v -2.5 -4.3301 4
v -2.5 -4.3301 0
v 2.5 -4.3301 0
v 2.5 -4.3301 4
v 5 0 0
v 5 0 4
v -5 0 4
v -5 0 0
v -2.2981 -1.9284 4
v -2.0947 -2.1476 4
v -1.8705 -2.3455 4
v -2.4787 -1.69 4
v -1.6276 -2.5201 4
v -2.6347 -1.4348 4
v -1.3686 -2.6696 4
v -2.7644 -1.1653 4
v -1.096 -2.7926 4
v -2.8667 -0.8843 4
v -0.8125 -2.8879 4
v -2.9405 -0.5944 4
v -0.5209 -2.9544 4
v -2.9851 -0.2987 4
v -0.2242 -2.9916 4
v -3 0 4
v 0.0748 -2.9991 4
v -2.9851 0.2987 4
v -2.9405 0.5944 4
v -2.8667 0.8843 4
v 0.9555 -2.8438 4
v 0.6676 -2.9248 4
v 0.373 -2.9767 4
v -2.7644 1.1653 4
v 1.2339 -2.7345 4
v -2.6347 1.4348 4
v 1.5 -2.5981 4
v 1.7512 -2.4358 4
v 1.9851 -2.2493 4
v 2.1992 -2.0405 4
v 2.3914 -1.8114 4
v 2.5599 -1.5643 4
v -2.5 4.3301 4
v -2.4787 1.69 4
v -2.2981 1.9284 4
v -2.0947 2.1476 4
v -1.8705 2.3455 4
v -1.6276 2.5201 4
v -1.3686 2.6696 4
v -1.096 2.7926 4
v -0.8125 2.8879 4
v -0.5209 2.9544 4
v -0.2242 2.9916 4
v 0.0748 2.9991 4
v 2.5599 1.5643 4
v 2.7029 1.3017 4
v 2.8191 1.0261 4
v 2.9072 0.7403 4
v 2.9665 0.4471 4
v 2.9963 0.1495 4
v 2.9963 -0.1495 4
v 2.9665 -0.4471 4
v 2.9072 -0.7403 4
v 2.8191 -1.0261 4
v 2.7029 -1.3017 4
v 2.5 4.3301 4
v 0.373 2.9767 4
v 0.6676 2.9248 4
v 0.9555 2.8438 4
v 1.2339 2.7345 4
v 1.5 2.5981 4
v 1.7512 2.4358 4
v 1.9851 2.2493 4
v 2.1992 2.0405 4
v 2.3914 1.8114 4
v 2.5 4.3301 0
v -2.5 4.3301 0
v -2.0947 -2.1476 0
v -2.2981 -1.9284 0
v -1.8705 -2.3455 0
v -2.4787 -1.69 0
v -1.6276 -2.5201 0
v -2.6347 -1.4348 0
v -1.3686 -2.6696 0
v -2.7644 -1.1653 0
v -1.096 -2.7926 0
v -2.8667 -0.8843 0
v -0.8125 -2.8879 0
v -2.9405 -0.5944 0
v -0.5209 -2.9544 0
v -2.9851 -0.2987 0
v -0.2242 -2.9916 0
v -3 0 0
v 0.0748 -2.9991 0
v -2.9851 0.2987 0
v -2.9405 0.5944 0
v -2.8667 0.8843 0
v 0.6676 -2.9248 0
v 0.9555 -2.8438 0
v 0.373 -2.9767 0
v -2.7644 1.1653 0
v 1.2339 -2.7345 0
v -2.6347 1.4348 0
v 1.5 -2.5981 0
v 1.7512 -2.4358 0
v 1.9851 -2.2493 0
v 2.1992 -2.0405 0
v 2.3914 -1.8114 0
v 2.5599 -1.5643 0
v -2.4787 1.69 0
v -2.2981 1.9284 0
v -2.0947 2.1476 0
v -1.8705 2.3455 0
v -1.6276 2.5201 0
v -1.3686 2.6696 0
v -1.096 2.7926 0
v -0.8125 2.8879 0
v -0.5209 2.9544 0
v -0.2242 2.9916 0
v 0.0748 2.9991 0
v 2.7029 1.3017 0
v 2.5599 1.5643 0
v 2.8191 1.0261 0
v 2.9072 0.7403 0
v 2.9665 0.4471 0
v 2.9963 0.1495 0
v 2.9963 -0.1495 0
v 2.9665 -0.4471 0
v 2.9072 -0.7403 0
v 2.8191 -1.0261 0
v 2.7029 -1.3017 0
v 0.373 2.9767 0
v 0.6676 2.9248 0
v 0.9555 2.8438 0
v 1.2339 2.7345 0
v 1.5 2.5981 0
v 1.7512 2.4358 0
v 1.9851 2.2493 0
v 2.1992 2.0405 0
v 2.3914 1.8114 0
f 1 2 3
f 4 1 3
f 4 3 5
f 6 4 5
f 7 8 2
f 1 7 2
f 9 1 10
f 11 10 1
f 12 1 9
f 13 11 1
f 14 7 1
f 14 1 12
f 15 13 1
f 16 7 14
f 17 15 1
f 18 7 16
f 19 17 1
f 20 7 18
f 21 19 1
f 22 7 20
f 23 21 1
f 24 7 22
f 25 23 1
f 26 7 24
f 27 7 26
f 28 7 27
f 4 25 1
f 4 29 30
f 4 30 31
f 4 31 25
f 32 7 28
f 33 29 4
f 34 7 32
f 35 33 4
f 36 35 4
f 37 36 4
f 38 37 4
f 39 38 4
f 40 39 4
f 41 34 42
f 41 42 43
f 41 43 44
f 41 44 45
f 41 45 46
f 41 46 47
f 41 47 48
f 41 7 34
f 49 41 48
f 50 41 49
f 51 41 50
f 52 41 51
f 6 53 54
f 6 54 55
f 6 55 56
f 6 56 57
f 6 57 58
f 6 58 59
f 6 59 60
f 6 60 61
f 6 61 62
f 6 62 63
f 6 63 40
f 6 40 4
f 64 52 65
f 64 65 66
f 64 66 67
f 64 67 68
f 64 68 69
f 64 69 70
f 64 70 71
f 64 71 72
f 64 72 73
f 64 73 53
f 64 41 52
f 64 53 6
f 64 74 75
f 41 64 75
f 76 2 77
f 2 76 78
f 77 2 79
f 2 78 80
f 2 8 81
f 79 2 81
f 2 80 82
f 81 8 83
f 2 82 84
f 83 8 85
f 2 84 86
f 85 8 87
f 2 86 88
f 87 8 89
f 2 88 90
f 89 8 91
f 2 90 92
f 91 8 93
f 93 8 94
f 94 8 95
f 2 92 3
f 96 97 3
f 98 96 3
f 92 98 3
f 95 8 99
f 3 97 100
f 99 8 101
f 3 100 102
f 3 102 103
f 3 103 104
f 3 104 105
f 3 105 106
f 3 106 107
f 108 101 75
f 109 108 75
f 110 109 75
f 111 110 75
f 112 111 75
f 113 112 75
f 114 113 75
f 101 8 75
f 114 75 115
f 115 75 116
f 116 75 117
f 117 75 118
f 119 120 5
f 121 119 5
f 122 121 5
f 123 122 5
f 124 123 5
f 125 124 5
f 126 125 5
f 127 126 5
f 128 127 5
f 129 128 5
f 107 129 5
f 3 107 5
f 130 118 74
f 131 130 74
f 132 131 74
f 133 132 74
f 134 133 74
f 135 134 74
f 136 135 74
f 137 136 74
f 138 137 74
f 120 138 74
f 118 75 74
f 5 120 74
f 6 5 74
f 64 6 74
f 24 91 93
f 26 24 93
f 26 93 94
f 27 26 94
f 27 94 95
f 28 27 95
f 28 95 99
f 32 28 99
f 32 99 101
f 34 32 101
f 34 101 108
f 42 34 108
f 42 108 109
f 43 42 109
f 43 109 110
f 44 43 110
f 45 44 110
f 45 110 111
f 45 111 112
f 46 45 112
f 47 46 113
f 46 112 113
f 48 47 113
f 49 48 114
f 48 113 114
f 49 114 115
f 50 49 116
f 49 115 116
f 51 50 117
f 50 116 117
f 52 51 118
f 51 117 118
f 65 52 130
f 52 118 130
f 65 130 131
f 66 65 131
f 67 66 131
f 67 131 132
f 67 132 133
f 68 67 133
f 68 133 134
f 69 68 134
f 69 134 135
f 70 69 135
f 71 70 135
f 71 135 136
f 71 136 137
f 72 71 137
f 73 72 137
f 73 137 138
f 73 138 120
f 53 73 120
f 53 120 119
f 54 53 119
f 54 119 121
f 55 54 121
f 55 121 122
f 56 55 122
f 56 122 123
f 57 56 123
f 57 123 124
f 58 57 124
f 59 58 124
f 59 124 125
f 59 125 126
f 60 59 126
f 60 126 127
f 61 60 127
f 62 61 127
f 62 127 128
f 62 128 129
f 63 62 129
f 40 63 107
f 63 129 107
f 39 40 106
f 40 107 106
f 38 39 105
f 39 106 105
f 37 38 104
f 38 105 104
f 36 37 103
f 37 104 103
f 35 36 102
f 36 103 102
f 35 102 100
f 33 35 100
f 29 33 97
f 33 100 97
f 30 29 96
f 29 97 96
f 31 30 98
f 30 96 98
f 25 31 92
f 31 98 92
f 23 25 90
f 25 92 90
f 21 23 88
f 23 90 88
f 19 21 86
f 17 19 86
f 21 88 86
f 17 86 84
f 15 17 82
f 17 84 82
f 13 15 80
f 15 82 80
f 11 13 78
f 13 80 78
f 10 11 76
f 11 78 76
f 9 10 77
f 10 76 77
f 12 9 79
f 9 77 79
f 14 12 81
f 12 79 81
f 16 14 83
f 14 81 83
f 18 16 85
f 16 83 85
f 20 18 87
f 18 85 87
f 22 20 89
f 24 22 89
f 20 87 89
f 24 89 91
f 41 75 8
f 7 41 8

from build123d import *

# Parameters (mm, degrees)
SALIENTE_EXTRUIR1_DEPTH = 4
CROQUIS3_R              = 3
CORTAR_EXTRUIR1_DEPTH   = 5


with BuildPart() as part:
    # Croquis2 → Saliente-Extruir1 (new body)
    with BuildSketch(Plane.XY):
        Polygon((5, 0), (2.5, 4.330127019), (-2.5, 4.330127019), (-5, 0), (-2.5, -4.330127019), (2.5, -4.330127019), align=None)
    extrude(amount=SALIENTE_EXTRUIR1_DEPTH)

    # Croquis3 → Cortar-Extruir1 (cut, through all)
    with BuildSketch(Plane(origin=(0, 0, 0), x_dir=(-1, 0, 0), z_dir=(0, 0, -1))):
        Circle(CROQUIS3_R)
    extrude(amount=-CORTAR_EXTRUIR1_DEPTH, mode=Mode.SUBTRACT)


solid = part.part
